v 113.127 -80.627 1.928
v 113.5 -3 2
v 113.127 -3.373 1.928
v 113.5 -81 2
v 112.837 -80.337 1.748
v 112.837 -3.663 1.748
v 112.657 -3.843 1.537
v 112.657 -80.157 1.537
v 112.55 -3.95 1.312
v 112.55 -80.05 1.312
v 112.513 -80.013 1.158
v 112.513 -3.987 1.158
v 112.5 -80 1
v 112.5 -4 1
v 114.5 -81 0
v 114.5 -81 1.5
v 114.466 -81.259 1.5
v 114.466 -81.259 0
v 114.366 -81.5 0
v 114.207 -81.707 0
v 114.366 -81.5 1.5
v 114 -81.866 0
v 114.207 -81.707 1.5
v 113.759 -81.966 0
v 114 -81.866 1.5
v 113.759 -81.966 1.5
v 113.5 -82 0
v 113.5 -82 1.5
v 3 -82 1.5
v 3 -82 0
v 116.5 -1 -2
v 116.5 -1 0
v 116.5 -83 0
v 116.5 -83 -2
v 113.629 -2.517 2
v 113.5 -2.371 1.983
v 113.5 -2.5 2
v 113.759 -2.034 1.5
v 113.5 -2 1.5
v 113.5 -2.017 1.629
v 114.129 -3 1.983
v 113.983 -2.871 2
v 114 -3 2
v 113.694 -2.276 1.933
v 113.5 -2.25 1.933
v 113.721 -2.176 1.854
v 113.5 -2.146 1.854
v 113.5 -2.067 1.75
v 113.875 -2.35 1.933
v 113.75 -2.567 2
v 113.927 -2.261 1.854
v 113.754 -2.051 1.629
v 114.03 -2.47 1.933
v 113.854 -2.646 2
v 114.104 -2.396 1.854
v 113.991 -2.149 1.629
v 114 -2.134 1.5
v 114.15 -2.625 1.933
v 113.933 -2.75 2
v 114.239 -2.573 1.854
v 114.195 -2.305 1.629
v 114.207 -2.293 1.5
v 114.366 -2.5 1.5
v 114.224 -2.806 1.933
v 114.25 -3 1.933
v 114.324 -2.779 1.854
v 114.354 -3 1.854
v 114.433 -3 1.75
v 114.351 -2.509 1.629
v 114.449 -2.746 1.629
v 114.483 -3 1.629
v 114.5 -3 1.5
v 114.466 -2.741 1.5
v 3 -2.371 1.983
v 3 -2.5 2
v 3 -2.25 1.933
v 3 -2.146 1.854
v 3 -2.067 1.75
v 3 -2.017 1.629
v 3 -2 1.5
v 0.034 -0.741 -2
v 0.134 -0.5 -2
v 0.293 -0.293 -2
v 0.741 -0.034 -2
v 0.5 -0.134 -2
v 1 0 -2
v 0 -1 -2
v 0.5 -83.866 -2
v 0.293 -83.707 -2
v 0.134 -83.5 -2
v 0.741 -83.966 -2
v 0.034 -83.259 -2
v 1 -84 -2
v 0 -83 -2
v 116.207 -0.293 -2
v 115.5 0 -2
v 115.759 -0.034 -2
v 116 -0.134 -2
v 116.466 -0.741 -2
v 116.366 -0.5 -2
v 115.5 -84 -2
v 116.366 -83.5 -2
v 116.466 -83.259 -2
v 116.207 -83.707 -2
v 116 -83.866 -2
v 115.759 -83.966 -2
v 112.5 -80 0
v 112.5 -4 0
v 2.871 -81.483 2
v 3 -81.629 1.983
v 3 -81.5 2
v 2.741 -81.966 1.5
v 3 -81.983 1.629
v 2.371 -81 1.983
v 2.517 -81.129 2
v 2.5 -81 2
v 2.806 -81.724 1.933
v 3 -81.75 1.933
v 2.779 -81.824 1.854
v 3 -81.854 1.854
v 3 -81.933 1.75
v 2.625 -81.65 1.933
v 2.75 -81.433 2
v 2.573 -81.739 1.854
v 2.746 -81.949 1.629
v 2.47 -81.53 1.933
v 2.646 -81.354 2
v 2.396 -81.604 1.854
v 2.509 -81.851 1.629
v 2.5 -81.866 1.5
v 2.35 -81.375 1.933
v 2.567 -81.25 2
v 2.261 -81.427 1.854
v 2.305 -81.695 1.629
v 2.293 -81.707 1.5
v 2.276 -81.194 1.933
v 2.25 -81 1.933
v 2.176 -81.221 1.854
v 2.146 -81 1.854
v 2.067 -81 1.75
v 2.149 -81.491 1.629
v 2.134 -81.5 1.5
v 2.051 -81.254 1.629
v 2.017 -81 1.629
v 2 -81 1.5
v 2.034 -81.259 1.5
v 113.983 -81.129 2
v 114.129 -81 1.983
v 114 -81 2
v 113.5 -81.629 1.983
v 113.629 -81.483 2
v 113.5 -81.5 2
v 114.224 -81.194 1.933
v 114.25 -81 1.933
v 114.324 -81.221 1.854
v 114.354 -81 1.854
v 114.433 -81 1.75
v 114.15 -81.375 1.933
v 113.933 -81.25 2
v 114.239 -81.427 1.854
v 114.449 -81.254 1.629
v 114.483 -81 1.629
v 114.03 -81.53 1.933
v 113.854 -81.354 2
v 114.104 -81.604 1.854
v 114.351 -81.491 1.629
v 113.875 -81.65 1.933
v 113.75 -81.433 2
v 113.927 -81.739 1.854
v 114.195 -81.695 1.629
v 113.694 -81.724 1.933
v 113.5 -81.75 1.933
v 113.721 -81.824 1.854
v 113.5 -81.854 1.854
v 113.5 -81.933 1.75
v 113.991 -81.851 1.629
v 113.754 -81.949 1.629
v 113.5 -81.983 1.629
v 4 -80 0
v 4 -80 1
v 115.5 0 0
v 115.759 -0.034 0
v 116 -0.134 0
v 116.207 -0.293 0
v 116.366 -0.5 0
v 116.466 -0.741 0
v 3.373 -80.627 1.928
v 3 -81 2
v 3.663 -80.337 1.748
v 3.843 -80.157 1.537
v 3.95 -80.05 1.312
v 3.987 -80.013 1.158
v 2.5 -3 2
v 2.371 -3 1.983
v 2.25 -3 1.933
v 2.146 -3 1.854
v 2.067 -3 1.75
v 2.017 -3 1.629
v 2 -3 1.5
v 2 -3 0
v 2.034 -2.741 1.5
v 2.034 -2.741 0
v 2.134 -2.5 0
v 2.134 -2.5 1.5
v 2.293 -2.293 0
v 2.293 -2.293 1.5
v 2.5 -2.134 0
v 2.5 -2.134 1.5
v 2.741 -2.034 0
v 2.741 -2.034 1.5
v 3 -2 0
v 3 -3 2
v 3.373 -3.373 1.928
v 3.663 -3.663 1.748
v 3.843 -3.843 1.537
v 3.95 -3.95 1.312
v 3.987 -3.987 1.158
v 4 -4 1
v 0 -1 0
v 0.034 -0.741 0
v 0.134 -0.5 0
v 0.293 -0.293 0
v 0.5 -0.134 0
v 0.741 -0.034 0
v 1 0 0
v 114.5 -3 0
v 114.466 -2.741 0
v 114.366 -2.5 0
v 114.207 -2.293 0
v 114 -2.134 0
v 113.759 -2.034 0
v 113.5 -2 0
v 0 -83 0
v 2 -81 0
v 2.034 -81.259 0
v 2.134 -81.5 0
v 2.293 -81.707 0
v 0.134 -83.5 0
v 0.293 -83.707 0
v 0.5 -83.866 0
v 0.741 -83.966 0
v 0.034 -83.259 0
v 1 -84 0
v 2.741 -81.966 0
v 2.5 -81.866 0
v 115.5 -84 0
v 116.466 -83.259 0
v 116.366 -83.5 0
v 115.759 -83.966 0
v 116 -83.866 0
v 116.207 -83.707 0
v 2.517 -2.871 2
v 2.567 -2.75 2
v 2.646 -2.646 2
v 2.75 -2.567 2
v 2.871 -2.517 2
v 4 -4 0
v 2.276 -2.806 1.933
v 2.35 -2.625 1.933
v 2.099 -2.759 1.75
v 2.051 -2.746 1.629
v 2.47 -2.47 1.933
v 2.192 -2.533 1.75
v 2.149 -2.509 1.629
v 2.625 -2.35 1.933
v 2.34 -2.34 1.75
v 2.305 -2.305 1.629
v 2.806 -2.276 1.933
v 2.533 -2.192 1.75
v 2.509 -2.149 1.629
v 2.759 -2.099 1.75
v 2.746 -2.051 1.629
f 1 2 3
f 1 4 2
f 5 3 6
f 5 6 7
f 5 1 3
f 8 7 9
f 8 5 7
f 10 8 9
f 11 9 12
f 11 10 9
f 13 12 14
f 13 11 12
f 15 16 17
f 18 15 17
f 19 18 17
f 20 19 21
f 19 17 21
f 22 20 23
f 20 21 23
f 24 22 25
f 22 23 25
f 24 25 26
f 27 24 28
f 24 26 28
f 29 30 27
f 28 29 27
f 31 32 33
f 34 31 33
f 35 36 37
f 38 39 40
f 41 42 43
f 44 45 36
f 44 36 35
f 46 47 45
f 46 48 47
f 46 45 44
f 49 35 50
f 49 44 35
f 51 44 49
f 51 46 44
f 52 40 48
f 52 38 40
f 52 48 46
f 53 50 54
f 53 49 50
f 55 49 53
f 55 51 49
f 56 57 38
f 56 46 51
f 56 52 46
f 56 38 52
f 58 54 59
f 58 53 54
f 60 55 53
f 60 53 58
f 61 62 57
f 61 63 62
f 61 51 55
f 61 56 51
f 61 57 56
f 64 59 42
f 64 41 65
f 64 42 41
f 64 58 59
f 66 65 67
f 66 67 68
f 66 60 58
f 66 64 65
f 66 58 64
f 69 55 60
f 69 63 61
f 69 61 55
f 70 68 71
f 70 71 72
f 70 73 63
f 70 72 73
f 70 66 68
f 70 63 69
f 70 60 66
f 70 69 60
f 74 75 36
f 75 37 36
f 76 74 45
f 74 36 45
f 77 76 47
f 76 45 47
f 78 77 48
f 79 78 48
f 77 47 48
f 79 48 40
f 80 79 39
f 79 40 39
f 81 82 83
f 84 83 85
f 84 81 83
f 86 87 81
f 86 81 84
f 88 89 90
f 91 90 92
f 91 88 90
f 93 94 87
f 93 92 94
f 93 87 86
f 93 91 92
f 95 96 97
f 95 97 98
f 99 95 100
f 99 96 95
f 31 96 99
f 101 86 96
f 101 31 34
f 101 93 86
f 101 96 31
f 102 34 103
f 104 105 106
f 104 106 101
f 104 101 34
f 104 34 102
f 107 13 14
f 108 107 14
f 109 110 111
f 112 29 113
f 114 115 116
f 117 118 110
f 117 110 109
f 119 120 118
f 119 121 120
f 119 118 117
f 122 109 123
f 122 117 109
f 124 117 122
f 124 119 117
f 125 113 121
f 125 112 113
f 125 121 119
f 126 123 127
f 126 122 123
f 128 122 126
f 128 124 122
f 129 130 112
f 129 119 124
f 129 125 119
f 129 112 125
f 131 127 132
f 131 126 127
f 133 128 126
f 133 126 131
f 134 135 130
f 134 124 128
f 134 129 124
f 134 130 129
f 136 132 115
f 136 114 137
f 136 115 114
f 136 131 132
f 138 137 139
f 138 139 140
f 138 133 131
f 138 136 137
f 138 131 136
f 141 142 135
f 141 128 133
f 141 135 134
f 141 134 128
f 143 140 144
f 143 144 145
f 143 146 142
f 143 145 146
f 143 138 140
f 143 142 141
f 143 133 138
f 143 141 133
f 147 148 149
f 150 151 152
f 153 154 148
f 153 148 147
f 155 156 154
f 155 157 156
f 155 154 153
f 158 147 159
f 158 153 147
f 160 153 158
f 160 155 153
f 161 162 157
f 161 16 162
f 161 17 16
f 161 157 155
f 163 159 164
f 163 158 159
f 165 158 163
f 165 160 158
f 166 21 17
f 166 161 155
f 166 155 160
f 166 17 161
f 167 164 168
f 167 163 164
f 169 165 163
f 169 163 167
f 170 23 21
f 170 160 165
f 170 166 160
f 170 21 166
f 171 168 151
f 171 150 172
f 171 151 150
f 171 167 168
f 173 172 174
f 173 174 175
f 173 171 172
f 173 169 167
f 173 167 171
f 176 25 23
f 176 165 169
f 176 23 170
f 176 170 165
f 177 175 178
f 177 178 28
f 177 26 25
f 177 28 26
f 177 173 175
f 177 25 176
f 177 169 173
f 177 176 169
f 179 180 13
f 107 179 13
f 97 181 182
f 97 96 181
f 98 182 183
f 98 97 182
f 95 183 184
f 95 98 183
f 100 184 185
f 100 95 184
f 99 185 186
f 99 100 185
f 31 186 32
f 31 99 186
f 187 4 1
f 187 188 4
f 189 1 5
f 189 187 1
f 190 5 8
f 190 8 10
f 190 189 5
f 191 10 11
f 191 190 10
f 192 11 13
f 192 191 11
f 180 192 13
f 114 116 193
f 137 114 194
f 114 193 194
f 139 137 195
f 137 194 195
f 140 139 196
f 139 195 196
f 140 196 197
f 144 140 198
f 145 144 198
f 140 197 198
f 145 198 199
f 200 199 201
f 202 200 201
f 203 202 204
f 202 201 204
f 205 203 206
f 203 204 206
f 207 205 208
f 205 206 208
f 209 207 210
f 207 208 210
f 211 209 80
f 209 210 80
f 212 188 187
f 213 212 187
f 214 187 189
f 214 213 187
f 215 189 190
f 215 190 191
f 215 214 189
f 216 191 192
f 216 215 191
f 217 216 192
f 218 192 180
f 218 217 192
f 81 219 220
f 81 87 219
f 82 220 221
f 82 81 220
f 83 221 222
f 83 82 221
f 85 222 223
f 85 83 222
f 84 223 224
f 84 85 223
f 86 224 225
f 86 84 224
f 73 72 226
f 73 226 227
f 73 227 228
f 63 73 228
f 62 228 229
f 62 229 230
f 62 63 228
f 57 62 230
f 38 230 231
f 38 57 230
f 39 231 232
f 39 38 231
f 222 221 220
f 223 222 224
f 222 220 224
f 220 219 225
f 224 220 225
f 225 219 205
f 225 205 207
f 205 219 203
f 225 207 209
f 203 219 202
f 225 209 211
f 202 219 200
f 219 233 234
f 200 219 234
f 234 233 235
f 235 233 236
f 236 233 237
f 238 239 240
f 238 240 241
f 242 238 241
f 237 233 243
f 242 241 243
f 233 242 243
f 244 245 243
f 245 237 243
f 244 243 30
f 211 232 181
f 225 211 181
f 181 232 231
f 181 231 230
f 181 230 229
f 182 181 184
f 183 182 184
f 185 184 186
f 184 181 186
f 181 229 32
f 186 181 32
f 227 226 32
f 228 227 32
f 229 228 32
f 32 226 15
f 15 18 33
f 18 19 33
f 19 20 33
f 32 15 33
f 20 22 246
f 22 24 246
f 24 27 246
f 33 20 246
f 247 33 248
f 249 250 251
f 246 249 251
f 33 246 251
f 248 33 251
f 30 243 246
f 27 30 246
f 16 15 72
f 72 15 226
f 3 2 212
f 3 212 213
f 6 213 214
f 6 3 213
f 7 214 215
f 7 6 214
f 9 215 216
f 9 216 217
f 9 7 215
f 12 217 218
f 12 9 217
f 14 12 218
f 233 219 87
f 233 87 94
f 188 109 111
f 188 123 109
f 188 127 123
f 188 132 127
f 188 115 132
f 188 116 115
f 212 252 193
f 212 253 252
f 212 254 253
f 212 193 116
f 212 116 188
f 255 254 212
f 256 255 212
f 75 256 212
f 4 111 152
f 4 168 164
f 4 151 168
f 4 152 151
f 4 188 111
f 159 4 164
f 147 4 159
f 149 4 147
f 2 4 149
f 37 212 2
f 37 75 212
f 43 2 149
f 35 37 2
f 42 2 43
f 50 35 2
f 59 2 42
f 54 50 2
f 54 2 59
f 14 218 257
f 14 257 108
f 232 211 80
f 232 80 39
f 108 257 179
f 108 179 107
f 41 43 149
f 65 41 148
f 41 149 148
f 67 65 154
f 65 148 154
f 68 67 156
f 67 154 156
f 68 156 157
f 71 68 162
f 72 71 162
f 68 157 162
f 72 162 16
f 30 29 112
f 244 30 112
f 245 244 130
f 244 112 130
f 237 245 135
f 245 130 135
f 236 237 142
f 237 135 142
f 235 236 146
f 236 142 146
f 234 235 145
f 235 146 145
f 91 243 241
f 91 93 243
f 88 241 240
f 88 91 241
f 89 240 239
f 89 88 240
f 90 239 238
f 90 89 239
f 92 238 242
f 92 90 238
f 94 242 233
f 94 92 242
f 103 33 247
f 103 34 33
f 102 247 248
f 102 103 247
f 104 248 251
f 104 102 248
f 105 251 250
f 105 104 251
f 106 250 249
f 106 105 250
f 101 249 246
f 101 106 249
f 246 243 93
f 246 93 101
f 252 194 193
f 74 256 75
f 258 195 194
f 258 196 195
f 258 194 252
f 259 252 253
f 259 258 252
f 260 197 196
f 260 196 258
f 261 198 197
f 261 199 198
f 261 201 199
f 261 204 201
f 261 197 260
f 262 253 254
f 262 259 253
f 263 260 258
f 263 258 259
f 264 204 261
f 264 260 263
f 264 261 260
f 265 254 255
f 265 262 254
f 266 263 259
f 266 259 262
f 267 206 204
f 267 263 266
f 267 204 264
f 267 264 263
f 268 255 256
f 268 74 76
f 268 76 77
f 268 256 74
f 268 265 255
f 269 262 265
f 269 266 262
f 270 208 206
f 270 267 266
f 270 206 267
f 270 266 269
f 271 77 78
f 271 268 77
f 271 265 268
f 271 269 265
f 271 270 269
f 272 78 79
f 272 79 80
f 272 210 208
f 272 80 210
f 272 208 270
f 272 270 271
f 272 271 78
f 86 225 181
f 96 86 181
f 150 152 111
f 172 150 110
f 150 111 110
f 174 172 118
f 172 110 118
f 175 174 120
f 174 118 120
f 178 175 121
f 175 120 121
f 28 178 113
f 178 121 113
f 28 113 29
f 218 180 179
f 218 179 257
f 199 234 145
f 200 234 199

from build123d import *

# Parameters (mm, degrees)
SKETCH021_W     = 116.5
SKETCH021_H     = 84
PAD008_DEPTH    = 2
SKETCH022_W     = 112.5
SKETCH022_H     = 80
PAD009_DEPTH    = 2
SKETCH023_W     = 108.5
SKETCH023_H     = 76
POCKET013_DEPTH = 2
FILLET014_R     = 1
FILLET015_R     = 1
FILLET016_R     = 1
FILLET017_R     = 1
FILLET018_R     = 1
FILLET019_R     = 1
FILLET020_R     = 1
FILLET021_R     = 0.5
FILLET022_R     = 1
FILLET023_R     = 1


with BuildPart() as part:
    # Sketch021 → Pad008 (new body)
    with BuildSketch(Plane(origin=(0, 0, 0), x_dir=(1, 0, 0), z_dir=(0, 0, -1))):
        with Locations((58.25, 42)):
            Rectangle(SKETCH021_W, SKETCH021_H)
    extrude(amount=PAD008_DEPTH)

    # Sketch022 (on Face5 of Pad008) → Pad009 (new body)
    with BuildSketch(Plane.XY):
        with Locations((58.25, -42)):
            Rectangle(SKETCH022_W, SKETCH022_H)
    extrude(amount=PAD009_DEPTH)

    # Sketch023 (on Face11 of Pad009) → Pocket013 (cut)
    with BuildSketch(Plane.XY.offset(2)):
        with Locations((58.25, -42)):
            Rectangle(SKETCH023_W, SKETCH023_H)
    extrude(amount=-POCKET013_DEPTH, mode=Mode.SUBTRACT)

    # Fillet014
    fillet014_edges = [part.edges().sort_by_distance(p)[0] for p in [
        (114.5, -82, 1),
    ]]
    fillet(fillet014_edges, radius=FILLET014_R)

    # Fillet015
    fillet015_edges = [part.edges().sort_by_distance(p)[0] for p in [
        (114.5, -2, 1),
        (116.5, 0, -1),
    ]]
    fillet(fillet015_edges, radius=FILLET015_R)

    # Fillet016
    fillet016_edges = [part.edges().sort_by_distance(p)[0] for p in [
        (116.5, -84, -1),
    ]]
    fillet(fillet016_edges, radius=FILLET016_R)

    # Fillet017
    fillet017_edges = [part.edges().sort_by_distance(p)[0] for p in [
        (0, -84, -1),
        (2, -82, 1),
    ]]
    fillet(fillet017_edges, radius=FILLET017_R)

    # Fillet018
    fillet018_edges = [part.edges().sort_by_distance(p)[0] for p in [
        (0, 0, -1),
        (2, -2, 1),
    ]]
    fillet(fillet018_edges, radius=FILLET018_R)

    # Fillet019
    fillet019_edges = [part.edges().sort_by_distance(p)[0] for p in [
        (58.25, -4, 2),
    ]]
    fillet(fillet019_edges, radius=FILLET019_R)

    # Fillet020
    fillet020_edges = [part.edges().sort_by_distance(p)[0] for p in [
        (4, -42, 2),
    ]]
    fillet(fillet020_edges, radius=FILLET020_R)

    # Fillet021
    fillet021_edges = [part.edges().sort_by_distance(p)[0] for p in [
        (58.25, -2, 2),
    ]]
    fillet(fillet021_edges, radius=FILLET021_R)

    # Fillet022
    fillet022_edges = [part.edges().sort_by_distance(p)[0] for p in [
        (58.25, -80, 2),
    ]]
    fillet(fillet022_edges, radius=FILLET022_R)

    # Fillet023
    fillet023_edges = [part.edges().sort_by_distance(p)[0] for p in [
        (112.5, -42, 2),
    ]]
    fillet(fillet023_edges, radius=FILLET023_R)


solid = part.part
